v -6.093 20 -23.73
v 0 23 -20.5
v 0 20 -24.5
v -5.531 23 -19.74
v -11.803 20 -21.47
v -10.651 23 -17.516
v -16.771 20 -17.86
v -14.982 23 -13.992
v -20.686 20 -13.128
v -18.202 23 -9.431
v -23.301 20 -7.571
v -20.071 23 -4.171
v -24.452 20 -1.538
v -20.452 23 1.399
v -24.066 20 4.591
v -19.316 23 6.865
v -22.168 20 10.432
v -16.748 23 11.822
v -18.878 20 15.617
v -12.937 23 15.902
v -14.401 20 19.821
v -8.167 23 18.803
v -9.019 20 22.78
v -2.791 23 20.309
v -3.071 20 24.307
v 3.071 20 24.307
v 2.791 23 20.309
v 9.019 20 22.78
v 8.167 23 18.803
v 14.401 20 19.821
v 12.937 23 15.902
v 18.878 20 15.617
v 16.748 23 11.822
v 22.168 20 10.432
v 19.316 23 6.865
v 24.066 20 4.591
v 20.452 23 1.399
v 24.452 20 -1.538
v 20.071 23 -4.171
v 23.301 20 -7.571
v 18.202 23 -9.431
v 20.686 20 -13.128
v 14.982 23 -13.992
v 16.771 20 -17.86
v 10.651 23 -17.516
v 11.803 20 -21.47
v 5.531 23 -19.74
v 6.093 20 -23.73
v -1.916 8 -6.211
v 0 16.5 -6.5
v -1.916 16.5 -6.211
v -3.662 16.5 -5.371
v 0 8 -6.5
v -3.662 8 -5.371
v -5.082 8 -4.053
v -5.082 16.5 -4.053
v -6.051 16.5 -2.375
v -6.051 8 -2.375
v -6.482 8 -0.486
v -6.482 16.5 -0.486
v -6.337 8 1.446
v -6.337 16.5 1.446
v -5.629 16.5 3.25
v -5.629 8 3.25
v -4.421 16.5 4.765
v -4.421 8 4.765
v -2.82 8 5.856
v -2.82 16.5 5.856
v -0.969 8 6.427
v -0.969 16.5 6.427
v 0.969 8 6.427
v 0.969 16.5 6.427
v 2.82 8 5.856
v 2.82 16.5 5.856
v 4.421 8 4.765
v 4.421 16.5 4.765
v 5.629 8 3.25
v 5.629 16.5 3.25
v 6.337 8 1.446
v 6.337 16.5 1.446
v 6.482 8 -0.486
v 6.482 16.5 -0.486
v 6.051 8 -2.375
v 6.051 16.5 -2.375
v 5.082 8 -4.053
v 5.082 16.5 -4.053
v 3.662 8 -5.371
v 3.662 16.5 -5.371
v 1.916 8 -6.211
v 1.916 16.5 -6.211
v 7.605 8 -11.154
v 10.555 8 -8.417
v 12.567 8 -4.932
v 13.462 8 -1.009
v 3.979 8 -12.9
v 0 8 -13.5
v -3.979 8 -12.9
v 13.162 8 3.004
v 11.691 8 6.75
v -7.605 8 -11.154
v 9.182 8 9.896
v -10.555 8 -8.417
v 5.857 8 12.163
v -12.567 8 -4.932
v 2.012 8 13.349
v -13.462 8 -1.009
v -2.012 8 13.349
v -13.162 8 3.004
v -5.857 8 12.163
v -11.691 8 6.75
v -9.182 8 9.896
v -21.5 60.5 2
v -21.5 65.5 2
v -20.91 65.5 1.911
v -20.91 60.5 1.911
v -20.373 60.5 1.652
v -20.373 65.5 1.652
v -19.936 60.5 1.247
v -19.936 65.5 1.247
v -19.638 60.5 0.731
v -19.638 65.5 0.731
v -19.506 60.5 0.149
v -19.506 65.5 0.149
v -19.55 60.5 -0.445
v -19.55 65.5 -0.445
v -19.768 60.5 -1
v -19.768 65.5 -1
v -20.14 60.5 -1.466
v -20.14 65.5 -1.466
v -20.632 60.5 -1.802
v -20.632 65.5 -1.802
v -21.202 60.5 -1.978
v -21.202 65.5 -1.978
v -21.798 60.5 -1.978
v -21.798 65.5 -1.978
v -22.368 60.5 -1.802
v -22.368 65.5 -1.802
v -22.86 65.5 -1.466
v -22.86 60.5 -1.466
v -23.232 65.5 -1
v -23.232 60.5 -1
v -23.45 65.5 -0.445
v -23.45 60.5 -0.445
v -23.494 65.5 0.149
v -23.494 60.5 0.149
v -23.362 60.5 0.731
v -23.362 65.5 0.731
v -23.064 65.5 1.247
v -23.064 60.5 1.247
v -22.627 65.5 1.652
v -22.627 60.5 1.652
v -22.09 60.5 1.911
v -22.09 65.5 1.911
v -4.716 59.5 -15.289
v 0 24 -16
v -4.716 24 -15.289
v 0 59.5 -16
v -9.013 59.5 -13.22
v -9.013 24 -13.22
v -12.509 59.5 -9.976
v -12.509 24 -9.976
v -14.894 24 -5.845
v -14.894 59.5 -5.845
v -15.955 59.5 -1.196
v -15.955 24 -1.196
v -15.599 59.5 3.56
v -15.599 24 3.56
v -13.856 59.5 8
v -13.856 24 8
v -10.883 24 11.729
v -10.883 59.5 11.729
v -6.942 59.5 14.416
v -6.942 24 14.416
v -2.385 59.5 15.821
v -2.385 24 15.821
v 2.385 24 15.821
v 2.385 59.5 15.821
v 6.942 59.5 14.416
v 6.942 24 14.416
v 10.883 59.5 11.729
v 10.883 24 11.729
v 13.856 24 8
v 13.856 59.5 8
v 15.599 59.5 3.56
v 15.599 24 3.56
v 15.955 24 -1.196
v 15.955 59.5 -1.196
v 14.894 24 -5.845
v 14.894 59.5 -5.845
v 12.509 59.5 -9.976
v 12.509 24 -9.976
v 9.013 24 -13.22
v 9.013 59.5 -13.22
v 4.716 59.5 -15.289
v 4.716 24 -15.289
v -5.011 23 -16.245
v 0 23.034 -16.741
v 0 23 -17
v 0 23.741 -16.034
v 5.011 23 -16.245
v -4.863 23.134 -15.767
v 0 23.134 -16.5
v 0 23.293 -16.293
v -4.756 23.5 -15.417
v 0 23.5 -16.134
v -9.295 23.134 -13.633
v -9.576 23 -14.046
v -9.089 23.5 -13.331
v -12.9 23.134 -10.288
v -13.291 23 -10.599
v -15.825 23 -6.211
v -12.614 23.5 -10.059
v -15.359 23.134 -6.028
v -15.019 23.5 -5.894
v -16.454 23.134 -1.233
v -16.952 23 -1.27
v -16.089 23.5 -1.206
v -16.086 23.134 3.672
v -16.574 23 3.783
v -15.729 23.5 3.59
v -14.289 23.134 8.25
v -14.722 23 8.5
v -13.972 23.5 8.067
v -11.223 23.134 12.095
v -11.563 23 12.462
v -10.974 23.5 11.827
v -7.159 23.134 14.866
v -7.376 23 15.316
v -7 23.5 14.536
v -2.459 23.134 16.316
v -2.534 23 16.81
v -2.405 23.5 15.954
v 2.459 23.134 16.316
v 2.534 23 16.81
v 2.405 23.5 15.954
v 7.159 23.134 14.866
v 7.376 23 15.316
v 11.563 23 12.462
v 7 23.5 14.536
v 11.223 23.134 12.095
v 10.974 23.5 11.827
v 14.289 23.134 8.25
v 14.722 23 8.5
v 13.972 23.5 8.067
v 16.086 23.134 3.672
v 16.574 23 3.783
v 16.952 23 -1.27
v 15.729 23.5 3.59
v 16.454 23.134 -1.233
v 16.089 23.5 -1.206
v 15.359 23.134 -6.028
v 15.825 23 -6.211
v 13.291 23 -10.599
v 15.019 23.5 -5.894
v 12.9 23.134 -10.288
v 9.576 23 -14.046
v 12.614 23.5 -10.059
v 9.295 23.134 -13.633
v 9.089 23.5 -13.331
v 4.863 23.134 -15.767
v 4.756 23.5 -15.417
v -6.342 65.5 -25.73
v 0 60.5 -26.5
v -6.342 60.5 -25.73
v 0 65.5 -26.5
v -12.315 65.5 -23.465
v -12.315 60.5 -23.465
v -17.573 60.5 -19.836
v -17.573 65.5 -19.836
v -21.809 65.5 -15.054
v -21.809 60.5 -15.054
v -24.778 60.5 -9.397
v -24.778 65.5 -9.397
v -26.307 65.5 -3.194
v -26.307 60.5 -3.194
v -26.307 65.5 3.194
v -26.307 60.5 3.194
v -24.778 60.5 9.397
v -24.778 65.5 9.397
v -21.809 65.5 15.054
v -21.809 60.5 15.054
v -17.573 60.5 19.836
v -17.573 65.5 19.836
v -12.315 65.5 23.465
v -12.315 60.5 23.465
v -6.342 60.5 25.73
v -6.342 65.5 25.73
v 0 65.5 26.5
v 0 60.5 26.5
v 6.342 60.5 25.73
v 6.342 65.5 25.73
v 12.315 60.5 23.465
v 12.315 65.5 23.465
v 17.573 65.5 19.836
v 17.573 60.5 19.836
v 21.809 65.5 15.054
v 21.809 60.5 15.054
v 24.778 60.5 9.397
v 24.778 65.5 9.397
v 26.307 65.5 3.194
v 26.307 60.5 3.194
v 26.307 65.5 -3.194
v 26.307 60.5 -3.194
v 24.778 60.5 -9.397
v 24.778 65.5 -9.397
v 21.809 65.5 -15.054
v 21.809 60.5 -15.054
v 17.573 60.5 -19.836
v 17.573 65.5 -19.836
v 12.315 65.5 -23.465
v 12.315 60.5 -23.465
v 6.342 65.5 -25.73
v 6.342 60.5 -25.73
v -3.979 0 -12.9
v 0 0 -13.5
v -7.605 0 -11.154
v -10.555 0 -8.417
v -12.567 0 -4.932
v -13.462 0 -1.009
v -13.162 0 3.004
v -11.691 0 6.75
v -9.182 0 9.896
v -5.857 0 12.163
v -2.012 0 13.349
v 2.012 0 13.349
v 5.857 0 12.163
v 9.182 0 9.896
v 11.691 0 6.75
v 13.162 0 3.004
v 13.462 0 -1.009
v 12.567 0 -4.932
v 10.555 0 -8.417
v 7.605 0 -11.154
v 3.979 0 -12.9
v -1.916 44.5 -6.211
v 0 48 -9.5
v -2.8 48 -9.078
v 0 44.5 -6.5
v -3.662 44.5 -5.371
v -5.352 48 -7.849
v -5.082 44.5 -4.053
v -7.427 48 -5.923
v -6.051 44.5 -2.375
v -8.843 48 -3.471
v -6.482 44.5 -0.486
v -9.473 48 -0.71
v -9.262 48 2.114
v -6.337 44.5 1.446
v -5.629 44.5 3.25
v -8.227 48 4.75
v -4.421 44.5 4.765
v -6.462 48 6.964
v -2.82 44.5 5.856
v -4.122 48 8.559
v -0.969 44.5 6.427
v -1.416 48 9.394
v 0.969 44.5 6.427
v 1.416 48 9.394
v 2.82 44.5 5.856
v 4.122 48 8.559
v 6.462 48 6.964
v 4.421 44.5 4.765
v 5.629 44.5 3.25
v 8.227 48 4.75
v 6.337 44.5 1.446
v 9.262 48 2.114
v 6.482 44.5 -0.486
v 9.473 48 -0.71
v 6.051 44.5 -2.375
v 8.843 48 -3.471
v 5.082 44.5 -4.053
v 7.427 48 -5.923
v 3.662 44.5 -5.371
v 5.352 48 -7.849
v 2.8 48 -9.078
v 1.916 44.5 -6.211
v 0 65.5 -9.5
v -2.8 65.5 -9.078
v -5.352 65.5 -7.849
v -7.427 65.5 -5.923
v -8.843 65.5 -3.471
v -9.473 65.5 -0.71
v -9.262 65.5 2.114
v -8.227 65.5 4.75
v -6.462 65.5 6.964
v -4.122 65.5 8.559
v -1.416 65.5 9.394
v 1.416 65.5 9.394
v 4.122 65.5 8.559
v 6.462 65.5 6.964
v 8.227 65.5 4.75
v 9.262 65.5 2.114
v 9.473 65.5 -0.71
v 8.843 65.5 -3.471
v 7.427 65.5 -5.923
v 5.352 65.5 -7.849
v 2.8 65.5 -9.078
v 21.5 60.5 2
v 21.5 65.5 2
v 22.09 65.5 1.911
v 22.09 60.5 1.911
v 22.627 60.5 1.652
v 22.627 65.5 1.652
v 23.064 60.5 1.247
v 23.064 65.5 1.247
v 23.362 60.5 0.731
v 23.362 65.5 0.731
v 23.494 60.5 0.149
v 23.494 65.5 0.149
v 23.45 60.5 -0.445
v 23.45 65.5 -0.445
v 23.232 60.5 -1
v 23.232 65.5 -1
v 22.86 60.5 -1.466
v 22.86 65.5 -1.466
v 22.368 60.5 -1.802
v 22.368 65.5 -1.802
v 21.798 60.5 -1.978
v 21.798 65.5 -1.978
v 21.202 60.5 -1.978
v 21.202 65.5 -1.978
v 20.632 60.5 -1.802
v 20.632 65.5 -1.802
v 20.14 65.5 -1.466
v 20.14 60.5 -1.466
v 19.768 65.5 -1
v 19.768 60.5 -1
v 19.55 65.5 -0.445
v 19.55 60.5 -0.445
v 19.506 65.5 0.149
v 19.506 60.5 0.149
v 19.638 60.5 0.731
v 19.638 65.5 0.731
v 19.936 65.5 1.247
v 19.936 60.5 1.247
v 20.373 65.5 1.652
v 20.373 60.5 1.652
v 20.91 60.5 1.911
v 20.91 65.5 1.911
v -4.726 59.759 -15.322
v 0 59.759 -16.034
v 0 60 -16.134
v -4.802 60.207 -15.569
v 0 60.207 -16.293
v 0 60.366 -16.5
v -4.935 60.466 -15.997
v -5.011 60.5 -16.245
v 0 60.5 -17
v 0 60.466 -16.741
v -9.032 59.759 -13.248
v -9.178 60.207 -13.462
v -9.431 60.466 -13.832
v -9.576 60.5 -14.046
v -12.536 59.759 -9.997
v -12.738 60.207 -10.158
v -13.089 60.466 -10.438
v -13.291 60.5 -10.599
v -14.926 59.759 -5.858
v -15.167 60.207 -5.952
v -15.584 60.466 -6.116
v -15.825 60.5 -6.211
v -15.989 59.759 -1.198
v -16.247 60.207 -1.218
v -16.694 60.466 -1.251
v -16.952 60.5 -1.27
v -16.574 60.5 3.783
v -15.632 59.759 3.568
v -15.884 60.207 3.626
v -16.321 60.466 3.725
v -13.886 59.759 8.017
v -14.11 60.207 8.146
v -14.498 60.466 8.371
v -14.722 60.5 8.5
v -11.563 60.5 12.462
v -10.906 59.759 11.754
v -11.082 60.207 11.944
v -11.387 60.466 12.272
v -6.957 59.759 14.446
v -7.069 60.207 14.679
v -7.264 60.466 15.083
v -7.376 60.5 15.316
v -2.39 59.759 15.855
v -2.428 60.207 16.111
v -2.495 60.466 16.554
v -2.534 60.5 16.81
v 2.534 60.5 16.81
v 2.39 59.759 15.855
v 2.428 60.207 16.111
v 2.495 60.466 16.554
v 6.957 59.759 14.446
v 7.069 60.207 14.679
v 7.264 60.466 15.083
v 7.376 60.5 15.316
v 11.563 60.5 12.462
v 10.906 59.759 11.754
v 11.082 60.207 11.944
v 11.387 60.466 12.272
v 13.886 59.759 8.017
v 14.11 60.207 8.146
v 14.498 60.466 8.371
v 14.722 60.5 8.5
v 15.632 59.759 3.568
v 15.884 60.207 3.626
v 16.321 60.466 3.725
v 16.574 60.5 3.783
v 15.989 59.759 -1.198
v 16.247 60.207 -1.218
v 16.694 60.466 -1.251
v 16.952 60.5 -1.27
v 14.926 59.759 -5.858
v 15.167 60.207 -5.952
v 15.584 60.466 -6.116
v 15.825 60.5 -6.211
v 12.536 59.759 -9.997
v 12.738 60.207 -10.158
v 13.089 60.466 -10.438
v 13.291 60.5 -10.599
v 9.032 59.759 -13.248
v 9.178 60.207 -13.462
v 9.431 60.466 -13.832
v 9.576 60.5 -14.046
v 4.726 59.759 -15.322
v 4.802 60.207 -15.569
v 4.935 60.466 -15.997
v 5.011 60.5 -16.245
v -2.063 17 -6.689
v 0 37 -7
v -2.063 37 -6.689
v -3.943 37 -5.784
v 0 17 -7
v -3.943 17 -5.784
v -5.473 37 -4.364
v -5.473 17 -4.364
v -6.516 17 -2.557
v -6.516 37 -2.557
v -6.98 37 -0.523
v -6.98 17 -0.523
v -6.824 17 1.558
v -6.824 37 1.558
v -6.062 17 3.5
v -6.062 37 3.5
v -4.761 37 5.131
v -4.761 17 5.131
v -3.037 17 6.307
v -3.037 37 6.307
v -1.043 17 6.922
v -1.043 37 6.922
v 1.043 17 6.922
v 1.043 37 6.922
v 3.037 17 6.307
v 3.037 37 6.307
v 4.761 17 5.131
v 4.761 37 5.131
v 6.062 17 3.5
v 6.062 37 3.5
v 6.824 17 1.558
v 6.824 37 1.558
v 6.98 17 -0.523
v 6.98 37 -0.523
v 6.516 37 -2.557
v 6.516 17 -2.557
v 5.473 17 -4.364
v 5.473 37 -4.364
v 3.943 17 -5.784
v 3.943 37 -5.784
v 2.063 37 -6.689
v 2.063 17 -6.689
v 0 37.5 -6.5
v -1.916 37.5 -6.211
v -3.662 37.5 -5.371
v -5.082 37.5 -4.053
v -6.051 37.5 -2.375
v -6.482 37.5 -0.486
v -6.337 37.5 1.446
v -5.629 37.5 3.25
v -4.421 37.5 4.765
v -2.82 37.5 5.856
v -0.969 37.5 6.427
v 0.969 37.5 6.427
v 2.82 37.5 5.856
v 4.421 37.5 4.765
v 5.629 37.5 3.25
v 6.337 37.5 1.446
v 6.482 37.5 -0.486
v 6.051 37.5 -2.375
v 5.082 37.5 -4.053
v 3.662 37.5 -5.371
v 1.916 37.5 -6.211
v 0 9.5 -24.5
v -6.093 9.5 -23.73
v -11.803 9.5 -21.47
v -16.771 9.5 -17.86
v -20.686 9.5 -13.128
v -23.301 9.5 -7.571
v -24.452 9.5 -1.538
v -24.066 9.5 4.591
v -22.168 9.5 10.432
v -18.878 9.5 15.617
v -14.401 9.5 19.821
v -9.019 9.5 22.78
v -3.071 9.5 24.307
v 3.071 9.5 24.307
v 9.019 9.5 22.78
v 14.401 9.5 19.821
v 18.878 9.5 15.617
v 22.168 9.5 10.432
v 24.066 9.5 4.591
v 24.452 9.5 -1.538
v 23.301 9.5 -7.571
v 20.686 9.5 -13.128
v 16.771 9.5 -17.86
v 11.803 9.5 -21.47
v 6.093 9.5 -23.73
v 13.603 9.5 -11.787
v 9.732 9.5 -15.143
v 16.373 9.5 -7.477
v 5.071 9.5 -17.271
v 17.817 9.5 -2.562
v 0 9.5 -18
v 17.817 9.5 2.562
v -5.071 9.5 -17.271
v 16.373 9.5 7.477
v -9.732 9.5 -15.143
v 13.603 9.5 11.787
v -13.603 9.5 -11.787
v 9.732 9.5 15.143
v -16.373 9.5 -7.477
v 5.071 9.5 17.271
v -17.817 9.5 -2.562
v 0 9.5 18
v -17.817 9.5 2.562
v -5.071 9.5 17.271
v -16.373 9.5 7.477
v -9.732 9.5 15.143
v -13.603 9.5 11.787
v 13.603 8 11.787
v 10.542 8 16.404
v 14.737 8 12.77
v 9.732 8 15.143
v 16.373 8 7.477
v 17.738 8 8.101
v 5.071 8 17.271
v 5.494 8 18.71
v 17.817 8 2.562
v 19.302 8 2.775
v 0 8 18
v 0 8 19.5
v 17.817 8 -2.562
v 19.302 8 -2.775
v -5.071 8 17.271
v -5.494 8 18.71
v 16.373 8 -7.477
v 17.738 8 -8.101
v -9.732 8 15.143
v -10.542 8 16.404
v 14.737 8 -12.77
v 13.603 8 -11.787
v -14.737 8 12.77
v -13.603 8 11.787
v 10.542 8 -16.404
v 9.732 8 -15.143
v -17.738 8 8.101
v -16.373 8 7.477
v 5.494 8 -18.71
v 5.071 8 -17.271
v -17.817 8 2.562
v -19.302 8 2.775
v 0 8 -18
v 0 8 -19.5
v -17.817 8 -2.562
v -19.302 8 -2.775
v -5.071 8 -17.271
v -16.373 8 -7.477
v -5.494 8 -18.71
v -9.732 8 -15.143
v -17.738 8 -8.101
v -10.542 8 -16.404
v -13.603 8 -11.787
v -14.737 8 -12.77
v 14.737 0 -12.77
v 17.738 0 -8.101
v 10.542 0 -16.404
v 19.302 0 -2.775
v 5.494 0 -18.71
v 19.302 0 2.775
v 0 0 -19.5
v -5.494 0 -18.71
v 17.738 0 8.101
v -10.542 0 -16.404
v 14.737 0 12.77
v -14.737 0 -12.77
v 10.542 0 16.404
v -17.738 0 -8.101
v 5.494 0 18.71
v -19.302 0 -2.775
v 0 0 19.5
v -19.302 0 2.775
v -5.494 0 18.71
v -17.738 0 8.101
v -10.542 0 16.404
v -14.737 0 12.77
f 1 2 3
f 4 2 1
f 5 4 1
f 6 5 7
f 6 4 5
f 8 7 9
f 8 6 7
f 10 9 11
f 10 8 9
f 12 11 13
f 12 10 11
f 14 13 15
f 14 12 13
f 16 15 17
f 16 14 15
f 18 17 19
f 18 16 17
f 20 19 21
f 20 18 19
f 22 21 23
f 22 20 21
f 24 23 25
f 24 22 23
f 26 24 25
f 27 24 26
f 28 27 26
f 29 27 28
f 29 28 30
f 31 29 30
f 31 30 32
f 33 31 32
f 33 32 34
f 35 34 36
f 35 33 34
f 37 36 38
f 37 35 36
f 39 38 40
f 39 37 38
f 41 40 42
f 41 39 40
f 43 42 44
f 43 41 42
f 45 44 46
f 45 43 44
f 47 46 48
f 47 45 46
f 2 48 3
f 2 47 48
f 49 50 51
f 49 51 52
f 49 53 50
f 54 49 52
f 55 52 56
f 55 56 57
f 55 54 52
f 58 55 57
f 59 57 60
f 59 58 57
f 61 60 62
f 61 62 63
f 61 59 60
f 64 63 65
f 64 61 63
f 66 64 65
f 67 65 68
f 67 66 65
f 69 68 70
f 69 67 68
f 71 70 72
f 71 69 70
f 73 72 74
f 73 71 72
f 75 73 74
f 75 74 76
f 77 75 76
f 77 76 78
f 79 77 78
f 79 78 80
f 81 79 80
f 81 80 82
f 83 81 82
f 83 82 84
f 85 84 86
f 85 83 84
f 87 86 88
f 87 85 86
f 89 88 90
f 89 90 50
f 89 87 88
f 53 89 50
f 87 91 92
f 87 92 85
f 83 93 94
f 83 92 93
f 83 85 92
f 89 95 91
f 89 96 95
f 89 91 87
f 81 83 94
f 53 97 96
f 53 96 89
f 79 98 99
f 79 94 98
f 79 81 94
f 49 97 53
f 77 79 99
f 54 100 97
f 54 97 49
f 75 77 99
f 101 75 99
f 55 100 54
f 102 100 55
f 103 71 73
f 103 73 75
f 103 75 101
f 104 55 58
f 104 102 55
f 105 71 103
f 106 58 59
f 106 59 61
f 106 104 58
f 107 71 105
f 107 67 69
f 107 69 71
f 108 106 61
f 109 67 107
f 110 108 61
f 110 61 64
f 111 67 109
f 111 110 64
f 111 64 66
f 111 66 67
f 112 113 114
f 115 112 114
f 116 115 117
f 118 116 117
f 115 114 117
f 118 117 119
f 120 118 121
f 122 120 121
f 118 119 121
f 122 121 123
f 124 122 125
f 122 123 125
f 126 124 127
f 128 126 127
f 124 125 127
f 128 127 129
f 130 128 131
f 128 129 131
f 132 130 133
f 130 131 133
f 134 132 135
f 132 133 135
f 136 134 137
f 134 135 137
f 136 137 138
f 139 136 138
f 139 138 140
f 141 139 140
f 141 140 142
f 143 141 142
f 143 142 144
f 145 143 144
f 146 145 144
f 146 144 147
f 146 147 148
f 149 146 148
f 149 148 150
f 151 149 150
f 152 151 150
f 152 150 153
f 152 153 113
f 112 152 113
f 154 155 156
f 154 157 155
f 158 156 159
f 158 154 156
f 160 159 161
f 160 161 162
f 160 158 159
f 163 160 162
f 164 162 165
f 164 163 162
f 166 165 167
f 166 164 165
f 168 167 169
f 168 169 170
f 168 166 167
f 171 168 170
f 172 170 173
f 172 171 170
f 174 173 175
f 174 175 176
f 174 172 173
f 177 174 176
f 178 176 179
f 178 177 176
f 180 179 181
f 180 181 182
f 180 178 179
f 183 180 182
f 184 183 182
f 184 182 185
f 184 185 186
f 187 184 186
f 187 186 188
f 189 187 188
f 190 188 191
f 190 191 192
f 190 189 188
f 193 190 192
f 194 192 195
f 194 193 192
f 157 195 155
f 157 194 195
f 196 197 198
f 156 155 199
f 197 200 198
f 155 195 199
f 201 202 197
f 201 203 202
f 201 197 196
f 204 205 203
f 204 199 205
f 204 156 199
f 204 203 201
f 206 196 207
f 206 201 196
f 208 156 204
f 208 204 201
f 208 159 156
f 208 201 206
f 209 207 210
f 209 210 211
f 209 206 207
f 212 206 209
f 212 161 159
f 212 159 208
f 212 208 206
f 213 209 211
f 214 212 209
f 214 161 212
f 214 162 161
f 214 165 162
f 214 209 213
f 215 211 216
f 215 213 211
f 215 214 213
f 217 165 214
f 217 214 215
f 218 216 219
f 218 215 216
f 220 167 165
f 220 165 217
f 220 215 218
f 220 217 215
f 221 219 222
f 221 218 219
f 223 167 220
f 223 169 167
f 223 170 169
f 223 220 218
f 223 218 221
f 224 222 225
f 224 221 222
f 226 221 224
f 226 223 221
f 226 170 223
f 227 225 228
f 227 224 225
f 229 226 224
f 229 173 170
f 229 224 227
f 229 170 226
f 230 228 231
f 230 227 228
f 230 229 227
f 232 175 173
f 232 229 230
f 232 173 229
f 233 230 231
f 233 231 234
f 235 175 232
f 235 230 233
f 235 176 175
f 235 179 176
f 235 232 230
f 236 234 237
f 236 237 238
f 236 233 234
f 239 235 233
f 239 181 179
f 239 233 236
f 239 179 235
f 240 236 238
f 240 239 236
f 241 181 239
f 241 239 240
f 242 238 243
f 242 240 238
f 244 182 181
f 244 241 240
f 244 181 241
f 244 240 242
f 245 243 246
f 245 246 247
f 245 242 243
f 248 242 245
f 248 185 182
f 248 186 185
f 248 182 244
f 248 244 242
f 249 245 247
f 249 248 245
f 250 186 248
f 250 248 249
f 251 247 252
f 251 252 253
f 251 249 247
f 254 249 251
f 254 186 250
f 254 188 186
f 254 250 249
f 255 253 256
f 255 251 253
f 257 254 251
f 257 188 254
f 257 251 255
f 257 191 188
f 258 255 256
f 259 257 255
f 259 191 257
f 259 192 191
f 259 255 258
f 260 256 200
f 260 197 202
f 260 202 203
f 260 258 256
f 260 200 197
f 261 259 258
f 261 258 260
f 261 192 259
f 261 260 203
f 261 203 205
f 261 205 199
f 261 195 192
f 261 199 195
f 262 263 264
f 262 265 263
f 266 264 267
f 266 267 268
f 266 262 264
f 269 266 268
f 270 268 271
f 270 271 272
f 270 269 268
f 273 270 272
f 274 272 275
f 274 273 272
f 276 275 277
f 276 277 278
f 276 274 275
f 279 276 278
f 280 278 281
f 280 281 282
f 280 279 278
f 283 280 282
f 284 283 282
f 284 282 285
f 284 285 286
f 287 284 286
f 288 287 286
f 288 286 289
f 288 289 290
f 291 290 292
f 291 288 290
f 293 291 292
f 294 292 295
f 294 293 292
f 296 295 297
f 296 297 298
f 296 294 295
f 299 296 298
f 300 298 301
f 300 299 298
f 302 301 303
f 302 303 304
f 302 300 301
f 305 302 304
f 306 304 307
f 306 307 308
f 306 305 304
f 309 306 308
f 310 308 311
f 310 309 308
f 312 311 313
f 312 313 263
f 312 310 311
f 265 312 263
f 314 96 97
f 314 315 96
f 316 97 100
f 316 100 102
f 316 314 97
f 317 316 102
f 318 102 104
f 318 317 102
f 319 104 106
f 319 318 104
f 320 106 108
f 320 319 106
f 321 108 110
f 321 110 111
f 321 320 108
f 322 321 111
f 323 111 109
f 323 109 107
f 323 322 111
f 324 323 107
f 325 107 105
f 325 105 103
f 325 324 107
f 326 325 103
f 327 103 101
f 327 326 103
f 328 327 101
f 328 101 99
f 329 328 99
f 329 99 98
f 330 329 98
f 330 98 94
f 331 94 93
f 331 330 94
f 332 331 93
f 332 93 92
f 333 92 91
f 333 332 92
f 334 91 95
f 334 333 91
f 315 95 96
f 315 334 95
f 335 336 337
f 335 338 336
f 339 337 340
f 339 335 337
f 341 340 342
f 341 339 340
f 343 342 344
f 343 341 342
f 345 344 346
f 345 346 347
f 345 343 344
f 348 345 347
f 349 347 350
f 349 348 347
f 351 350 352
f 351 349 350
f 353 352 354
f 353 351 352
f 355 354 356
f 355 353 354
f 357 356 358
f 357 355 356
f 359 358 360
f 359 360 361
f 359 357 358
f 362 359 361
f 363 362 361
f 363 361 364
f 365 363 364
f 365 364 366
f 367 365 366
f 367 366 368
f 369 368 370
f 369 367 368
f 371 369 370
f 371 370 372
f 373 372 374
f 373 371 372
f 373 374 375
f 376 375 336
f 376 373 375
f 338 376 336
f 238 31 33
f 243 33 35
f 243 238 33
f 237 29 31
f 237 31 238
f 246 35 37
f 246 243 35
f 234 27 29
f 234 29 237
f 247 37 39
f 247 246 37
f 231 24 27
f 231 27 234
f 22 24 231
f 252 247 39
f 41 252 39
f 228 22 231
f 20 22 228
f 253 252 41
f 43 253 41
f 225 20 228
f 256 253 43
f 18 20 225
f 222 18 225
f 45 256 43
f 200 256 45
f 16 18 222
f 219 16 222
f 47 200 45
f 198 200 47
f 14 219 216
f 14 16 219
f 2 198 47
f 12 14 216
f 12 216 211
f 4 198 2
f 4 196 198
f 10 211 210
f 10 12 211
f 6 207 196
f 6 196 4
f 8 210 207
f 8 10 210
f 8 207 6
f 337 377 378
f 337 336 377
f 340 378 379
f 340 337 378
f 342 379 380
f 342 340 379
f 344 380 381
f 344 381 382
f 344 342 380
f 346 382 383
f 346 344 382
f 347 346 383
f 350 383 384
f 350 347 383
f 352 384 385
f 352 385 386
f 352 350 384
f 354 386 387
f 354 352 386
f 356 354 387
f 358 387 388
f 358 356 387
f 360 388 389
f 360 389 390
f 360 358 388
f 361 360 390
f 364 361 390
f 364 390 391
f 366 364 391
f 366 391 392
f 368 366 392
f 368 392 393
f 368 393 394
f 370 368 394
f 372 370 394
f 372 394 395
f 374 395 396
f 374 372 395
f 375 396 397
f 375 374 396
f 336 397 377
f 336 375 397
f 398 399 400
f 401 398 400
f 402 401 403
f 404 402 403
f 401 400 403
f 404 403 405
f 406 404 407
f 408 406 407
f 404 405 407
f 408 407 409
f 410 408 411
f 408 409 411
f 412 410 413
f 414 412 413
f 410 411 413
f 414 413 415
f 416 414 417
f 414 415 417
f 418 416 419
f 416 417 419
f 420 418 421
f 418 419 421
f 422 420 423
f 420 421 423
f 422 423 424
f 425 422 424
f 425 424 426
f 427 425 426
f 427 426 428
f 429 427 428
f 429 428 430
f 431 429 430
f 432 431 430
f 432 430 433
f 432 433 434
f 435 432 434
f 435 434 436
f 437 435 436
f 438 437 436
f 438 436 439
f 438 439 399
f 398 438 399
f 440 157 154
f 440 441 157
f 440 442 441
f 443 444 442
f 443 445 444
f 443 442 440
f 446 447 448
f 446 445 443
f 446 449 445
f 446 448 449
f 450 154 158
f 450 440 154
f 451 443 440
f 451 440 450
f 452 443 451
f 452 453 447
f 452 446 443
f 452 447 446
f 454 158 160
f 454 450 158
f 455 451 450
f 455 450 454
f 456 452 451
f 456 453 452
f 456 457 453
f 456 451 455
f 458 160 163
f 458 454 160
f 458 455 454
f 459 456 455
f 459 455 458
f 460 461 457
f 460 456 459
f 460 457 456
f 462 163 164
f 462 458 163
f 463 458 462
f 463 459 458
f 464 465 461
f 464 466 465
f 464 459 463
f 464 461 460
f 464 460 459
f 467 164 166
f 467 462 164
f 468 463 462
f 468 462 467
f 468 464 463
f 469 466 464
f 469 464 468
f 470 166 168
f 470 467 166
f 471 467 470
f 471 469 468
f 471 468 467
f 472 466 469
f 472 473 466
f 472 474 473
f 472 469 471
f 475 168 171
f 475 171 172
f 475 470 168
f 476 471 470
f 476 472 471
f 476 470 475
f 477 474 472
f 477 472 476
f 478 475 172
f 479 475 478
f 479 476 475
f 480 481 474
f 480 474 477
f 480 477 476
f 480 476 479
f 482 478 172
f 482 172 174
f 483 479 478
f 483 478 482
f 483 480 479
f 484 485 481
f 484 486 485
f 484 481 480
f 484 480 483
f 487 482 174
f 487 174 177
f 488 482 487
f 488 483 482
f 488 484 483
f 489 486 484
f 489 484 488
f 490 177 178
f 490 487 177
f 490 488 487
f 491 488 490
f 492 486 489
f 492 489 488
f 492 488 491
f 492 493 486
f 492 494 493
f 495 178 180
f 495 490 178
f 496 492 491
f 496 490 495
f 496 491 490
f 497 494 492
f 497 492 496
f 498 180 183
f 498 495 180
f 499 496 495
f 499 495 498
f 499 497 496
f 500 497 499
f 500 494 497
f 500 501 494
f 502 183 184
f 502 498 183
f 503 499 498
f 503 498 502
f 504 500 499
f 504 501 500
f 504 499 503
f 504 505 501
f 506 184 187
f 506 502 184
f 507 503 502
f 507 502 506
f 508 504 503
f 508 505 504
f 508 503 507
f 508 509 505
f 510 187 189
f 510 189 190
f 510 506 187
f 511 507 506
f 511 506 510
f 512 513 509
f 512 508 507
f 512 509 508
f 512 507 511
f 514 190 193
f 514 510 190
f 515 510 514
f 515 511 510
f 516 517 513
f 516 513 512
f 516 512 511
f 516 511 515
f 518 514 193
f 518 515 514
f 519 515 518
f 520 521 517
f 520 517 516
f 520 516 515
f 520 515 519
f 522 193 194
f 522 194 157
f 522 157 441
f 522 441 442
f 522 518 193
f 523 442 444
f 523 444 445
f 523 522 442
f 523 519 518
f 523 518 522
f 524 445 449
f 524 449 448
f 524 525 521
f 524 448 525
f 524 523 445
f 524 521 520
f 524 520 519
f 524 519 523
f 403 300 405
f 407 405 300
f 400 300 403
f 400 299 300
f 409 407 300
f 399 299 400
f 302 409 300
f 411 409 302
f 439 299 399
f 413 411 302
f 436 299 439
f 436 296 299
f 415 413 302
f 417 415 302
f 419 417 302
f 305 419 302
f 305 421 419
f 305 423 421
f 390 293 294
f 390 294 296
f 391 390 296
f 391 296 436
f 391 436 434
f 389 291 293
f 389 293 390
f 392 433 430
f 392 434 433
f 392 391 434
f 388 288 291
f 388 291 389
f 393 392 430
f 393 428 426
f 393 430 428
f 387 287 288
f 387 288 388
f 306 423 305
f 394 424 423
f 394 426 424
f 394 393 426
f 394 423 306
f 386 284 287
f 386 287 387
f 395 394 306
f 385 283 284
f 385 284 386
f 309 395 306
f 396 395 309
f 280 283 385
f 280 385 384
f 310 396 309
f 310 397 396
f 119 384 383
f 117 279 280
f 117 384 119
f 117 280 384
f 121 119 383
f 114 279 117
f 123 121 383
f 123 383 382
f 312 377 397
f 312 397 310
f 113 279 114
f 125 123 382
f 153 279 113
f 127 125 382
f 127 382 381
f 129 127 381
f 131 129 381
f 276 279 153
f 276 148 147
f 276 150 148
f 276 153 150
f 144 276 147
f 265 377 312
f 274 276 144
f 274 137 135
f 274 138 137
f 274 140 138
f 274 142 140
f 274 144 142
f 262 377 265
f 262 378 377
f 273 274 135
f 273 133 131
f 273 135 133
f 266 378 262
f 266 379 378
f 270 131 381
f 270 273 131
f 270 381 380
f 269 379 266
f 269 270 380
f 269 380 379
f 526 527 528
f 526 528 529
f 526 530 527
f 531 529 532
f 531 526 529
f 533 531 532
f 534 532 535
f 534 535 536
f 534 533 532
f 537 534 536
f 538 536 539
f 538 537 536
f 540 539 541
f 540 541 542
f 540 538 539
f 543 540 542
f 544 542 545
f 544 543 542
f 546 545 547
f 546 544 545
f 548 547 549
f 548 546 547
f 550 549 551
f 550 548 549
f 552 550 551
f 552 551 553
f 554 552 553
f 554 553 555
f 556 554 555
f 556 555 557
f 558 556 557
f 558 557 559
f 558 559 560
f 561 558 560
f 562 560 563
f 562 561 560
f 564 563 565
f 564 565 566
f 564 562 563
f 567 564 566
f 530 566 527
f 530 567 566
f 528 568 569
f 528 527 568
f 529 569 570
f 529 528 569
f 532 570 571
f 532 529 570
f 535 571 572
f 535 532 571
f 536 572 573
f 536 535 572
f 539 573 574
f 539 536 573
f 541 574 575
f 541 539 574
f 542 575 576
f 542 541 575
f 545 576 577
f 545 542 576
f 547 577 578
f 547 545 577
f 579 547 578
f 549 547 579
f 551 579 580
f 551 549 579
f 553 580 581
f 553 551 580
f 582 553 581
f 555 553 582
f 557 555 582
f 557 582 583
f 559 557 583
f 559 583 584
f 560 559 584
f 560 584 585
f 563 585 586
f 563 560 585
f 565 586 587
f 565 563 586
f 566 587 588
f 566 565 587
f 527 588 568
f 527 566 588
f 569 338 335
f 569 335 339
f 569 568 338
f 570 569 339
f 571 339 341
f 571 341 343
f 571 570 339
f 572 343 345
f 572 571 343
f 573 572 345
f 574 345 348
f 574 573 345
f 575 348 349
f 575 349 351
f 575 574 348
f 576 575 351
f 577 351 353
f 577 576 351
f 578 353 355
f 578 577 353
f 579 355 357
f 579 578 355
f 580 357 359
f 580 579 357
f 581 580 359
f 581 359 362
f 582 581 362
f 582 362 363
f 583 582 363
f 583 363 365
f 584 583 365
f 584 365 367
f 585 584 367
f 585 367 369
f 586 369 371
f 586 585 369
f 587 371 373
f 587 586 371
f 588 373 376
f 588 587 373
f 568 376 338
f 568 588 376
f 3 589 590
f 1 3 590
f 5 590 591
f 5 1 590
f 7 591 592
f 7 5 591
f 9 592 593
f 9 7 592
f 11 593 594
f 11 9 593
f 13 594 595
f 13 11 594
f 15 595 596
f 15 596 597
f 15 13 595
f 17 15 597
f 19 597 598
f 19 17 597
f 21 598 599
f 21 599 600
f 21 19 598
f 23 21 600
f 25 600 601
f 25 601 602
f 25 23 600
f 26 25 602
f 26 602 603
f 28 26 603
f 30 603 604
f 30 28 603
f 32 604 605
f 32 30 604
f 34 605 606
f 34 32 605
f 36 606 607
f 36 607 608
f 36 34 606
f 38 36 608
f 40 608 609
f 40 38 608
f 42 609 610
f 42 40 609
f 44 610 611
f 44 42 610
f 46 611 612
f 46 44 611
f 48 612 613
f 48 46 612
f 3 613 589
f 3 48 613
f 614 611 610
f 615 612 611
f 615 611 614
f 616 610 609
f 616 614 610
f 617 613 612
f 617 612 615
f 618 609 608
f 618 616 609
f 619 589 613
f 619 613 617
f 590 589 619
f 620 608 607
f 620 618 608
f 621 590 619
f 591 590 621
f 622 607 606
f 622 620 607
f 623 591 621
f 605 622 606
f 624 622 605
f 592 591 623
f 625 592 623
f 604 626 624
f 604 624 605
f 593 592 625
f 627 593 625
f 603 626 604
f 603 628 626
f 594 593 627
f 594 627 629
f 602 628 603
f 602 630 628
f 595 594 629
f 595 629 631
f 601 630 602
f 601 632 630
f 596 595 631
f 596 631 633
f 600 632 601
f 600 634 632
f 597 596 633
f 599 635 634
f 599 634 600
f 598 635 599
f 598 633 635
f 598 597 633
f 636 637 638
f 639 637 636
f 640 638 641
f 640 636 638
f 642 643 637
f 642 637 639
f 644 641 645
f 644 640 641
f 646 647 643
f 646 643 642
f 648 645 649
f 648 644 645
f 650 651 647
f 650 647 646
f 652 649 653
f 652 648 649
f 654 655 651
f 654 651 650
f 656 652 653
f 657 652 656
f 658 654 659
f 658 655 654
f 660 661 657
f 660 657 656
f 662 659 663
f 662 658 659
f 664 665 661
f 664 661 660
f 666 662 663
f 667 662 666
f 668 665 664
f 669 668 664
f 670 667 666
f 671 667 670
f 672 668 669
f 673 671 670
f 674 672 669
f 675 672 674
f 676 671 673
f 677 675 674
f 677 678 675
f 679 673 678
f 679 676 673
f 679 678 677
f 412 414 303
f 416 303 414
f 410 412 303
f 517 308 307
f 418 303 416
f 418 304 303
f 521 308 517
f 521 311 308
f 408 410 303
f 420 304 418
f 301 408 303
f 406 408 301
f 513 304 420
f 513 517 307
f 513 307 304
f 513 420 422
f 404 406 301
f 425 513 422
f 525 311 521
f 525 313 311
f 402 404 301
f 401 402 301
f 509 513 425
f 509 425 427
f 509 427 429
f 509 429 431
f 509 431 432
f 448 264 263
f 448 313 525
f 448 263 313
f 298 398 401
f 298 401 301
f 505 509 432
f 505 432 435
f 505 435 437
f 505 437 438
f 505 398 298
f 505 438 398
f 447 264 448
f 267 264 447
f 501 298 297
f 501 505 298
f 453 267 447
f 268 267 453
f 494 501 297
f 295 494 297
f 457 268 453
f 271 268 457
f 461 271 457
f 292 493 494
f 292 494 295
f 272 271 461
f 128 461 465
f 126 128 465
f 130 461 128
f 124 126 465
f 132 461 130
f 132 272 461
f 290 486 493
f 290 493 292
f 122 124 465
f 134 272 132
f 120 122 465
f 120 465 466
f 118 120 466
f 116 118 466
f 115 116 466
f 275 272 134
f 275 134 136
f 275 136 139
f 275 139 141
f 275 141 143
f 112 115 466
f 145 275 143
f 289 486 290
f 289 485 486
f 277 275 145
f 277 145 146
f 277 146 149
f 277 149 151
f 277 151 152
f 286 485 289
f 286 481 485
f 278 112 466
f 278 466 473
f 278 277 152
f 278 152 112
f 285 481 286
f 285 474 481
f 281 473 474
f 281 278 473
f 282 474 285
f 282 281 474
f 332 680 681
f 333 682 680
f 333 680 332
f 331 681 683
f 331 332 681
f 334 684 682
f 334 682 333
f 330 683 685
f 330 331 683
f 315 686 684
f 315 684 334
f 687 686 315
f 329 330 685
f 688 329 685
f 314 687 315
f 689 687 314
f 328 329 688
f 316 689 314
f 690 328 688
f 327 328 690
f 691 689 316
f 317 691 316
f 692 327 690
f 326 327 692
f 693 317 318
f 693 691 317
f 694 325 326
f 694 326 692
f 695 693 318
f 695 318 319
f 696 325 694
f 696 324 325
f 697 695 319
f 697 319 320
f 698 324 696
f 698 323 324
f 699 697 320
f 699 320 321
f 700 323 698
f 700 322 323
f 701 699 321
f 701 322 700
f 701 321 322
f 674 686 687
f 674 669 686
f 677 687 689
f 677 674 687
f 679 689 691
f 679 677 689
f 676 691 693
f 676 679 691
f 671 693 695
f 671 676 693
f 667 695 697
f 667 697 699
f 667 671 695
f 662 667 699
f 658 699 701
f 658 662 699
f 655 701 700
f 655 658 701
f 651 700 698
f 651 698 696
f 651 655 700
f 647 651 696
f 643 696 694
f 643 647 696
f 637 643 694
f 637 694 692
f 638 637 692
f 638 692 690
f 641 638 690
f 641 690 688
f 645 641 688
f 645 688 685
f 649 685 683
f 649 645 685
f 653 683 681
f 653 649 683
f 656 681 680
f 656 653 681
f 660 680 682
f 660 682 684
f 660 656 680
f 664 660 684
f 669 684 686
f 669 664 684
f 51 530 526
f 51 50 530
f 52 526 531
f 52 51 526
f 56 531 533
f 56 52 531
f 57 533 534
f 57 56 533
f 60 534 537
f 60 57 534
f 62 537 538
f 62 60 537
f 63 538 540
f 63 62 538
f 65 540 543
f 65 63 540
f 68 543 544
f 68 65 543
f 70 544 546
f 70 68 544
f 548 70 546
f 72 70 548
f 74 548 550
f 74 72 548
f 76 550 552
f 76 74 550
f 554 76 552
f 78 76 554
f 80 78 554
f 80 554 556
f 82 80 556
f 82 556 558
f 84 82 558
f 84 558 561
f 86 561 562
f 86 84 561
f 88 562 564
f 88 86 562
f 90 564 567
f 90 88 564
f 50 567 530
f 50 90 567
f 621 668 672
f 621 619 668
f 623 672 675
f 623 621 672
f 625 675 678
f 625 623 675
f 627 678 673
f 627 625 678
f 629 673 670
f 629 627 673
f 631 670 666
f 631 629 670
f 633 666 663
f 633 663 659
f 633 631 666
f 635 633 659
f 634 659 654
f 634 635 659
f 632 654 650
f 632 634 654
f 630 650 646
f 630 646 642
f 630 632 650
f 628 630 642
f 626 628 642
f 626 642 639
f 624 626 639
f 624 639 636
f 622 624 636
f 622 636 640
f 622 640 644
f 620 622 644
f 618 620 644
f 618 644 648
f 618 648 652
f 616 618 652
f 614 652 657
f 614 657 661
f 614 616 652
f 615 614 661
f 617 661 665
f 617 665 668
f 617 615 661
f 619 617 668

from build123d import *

# Parameters (mm, degrees)
SKETCH2_R          = 2
CUT_EXTRUDE1_DEPTH = 10


with BuildPart() as part:
    # Sketch1 → Revolve1 (revolve)
    with BuildSketch(Plane.XY, mode=Mode.PRIVATE) as revolve1_sk:
        with BuildLine():
            Line((13.5, 0), (19.5, 0))
            Line((19.5, 0), (19.5, 8))
            Line((19.5, 8), (18, 8))
            Line((18, 8), (18, 9.5))
            Line((18, 9.5), (24.5, 9.5))
            Line((24.5, 9.5), (24.5, 20))
            Line((24.5, 20), (20.5, 23))
            Line((20.5, 23), (17, 23))
            ThreePointArc((17, 23), (16.292893219, 23.292893219), (16, 24))
            Line((16, 24), (16, 59.5))
            ThreePointArc((16, 59.5), (16.292893219, 60.207106781), (17, 60.5))
            Line((17, 60.5), (26.5, 60.5))
            Line((26.5, 60.5), (26.5, 65.5))
            Line((26.5, 65.5), (9.5, 65.5))
            Line((9.5, 65.5), (9.5, 48))
            Line((9.5, 48), (6.5, 44.5))
            Line((6.5, 44.5), (6.5, 37.5))
            Line((6.5, 37.5), (7, 37))
            Line((7, 37), (7, 17))
            Line((7, 17), (6.5, 16.5))
            Line((6.5, 16.5), (6.5, 8))
            Line((6.5, 8), (13.5, 8))
            Line((13.5, 8), (13.5, 0))
        make_face()
    revolve(revolve1_sk.sketch.rotate(Axis((0, 0, 0), (0, 1, 0)), 90), axis=Axis((0, 0, 0), (0, 1, 0)))

    # Sketch2 → Cut-Extrude1 (cut)
    with BuildSketch(Plane(origin=(0, 65.5, 0), x_dir=(1, 0, 0), z_dir=(0, 1, 0))):
        with Locations(Location((21.5, 0, 0), (0, 0, 270))):
            Circle(SKETCH2_R)
        with Locations(Location((-21.5, 0, 0), (0, 0, 270))):
            Circle(SKETCH2_R)
    extrude(amount=-CUT_EXTRUDE1_DEPTH, mode=Mode.SUBTRACT)


solid = part.part
